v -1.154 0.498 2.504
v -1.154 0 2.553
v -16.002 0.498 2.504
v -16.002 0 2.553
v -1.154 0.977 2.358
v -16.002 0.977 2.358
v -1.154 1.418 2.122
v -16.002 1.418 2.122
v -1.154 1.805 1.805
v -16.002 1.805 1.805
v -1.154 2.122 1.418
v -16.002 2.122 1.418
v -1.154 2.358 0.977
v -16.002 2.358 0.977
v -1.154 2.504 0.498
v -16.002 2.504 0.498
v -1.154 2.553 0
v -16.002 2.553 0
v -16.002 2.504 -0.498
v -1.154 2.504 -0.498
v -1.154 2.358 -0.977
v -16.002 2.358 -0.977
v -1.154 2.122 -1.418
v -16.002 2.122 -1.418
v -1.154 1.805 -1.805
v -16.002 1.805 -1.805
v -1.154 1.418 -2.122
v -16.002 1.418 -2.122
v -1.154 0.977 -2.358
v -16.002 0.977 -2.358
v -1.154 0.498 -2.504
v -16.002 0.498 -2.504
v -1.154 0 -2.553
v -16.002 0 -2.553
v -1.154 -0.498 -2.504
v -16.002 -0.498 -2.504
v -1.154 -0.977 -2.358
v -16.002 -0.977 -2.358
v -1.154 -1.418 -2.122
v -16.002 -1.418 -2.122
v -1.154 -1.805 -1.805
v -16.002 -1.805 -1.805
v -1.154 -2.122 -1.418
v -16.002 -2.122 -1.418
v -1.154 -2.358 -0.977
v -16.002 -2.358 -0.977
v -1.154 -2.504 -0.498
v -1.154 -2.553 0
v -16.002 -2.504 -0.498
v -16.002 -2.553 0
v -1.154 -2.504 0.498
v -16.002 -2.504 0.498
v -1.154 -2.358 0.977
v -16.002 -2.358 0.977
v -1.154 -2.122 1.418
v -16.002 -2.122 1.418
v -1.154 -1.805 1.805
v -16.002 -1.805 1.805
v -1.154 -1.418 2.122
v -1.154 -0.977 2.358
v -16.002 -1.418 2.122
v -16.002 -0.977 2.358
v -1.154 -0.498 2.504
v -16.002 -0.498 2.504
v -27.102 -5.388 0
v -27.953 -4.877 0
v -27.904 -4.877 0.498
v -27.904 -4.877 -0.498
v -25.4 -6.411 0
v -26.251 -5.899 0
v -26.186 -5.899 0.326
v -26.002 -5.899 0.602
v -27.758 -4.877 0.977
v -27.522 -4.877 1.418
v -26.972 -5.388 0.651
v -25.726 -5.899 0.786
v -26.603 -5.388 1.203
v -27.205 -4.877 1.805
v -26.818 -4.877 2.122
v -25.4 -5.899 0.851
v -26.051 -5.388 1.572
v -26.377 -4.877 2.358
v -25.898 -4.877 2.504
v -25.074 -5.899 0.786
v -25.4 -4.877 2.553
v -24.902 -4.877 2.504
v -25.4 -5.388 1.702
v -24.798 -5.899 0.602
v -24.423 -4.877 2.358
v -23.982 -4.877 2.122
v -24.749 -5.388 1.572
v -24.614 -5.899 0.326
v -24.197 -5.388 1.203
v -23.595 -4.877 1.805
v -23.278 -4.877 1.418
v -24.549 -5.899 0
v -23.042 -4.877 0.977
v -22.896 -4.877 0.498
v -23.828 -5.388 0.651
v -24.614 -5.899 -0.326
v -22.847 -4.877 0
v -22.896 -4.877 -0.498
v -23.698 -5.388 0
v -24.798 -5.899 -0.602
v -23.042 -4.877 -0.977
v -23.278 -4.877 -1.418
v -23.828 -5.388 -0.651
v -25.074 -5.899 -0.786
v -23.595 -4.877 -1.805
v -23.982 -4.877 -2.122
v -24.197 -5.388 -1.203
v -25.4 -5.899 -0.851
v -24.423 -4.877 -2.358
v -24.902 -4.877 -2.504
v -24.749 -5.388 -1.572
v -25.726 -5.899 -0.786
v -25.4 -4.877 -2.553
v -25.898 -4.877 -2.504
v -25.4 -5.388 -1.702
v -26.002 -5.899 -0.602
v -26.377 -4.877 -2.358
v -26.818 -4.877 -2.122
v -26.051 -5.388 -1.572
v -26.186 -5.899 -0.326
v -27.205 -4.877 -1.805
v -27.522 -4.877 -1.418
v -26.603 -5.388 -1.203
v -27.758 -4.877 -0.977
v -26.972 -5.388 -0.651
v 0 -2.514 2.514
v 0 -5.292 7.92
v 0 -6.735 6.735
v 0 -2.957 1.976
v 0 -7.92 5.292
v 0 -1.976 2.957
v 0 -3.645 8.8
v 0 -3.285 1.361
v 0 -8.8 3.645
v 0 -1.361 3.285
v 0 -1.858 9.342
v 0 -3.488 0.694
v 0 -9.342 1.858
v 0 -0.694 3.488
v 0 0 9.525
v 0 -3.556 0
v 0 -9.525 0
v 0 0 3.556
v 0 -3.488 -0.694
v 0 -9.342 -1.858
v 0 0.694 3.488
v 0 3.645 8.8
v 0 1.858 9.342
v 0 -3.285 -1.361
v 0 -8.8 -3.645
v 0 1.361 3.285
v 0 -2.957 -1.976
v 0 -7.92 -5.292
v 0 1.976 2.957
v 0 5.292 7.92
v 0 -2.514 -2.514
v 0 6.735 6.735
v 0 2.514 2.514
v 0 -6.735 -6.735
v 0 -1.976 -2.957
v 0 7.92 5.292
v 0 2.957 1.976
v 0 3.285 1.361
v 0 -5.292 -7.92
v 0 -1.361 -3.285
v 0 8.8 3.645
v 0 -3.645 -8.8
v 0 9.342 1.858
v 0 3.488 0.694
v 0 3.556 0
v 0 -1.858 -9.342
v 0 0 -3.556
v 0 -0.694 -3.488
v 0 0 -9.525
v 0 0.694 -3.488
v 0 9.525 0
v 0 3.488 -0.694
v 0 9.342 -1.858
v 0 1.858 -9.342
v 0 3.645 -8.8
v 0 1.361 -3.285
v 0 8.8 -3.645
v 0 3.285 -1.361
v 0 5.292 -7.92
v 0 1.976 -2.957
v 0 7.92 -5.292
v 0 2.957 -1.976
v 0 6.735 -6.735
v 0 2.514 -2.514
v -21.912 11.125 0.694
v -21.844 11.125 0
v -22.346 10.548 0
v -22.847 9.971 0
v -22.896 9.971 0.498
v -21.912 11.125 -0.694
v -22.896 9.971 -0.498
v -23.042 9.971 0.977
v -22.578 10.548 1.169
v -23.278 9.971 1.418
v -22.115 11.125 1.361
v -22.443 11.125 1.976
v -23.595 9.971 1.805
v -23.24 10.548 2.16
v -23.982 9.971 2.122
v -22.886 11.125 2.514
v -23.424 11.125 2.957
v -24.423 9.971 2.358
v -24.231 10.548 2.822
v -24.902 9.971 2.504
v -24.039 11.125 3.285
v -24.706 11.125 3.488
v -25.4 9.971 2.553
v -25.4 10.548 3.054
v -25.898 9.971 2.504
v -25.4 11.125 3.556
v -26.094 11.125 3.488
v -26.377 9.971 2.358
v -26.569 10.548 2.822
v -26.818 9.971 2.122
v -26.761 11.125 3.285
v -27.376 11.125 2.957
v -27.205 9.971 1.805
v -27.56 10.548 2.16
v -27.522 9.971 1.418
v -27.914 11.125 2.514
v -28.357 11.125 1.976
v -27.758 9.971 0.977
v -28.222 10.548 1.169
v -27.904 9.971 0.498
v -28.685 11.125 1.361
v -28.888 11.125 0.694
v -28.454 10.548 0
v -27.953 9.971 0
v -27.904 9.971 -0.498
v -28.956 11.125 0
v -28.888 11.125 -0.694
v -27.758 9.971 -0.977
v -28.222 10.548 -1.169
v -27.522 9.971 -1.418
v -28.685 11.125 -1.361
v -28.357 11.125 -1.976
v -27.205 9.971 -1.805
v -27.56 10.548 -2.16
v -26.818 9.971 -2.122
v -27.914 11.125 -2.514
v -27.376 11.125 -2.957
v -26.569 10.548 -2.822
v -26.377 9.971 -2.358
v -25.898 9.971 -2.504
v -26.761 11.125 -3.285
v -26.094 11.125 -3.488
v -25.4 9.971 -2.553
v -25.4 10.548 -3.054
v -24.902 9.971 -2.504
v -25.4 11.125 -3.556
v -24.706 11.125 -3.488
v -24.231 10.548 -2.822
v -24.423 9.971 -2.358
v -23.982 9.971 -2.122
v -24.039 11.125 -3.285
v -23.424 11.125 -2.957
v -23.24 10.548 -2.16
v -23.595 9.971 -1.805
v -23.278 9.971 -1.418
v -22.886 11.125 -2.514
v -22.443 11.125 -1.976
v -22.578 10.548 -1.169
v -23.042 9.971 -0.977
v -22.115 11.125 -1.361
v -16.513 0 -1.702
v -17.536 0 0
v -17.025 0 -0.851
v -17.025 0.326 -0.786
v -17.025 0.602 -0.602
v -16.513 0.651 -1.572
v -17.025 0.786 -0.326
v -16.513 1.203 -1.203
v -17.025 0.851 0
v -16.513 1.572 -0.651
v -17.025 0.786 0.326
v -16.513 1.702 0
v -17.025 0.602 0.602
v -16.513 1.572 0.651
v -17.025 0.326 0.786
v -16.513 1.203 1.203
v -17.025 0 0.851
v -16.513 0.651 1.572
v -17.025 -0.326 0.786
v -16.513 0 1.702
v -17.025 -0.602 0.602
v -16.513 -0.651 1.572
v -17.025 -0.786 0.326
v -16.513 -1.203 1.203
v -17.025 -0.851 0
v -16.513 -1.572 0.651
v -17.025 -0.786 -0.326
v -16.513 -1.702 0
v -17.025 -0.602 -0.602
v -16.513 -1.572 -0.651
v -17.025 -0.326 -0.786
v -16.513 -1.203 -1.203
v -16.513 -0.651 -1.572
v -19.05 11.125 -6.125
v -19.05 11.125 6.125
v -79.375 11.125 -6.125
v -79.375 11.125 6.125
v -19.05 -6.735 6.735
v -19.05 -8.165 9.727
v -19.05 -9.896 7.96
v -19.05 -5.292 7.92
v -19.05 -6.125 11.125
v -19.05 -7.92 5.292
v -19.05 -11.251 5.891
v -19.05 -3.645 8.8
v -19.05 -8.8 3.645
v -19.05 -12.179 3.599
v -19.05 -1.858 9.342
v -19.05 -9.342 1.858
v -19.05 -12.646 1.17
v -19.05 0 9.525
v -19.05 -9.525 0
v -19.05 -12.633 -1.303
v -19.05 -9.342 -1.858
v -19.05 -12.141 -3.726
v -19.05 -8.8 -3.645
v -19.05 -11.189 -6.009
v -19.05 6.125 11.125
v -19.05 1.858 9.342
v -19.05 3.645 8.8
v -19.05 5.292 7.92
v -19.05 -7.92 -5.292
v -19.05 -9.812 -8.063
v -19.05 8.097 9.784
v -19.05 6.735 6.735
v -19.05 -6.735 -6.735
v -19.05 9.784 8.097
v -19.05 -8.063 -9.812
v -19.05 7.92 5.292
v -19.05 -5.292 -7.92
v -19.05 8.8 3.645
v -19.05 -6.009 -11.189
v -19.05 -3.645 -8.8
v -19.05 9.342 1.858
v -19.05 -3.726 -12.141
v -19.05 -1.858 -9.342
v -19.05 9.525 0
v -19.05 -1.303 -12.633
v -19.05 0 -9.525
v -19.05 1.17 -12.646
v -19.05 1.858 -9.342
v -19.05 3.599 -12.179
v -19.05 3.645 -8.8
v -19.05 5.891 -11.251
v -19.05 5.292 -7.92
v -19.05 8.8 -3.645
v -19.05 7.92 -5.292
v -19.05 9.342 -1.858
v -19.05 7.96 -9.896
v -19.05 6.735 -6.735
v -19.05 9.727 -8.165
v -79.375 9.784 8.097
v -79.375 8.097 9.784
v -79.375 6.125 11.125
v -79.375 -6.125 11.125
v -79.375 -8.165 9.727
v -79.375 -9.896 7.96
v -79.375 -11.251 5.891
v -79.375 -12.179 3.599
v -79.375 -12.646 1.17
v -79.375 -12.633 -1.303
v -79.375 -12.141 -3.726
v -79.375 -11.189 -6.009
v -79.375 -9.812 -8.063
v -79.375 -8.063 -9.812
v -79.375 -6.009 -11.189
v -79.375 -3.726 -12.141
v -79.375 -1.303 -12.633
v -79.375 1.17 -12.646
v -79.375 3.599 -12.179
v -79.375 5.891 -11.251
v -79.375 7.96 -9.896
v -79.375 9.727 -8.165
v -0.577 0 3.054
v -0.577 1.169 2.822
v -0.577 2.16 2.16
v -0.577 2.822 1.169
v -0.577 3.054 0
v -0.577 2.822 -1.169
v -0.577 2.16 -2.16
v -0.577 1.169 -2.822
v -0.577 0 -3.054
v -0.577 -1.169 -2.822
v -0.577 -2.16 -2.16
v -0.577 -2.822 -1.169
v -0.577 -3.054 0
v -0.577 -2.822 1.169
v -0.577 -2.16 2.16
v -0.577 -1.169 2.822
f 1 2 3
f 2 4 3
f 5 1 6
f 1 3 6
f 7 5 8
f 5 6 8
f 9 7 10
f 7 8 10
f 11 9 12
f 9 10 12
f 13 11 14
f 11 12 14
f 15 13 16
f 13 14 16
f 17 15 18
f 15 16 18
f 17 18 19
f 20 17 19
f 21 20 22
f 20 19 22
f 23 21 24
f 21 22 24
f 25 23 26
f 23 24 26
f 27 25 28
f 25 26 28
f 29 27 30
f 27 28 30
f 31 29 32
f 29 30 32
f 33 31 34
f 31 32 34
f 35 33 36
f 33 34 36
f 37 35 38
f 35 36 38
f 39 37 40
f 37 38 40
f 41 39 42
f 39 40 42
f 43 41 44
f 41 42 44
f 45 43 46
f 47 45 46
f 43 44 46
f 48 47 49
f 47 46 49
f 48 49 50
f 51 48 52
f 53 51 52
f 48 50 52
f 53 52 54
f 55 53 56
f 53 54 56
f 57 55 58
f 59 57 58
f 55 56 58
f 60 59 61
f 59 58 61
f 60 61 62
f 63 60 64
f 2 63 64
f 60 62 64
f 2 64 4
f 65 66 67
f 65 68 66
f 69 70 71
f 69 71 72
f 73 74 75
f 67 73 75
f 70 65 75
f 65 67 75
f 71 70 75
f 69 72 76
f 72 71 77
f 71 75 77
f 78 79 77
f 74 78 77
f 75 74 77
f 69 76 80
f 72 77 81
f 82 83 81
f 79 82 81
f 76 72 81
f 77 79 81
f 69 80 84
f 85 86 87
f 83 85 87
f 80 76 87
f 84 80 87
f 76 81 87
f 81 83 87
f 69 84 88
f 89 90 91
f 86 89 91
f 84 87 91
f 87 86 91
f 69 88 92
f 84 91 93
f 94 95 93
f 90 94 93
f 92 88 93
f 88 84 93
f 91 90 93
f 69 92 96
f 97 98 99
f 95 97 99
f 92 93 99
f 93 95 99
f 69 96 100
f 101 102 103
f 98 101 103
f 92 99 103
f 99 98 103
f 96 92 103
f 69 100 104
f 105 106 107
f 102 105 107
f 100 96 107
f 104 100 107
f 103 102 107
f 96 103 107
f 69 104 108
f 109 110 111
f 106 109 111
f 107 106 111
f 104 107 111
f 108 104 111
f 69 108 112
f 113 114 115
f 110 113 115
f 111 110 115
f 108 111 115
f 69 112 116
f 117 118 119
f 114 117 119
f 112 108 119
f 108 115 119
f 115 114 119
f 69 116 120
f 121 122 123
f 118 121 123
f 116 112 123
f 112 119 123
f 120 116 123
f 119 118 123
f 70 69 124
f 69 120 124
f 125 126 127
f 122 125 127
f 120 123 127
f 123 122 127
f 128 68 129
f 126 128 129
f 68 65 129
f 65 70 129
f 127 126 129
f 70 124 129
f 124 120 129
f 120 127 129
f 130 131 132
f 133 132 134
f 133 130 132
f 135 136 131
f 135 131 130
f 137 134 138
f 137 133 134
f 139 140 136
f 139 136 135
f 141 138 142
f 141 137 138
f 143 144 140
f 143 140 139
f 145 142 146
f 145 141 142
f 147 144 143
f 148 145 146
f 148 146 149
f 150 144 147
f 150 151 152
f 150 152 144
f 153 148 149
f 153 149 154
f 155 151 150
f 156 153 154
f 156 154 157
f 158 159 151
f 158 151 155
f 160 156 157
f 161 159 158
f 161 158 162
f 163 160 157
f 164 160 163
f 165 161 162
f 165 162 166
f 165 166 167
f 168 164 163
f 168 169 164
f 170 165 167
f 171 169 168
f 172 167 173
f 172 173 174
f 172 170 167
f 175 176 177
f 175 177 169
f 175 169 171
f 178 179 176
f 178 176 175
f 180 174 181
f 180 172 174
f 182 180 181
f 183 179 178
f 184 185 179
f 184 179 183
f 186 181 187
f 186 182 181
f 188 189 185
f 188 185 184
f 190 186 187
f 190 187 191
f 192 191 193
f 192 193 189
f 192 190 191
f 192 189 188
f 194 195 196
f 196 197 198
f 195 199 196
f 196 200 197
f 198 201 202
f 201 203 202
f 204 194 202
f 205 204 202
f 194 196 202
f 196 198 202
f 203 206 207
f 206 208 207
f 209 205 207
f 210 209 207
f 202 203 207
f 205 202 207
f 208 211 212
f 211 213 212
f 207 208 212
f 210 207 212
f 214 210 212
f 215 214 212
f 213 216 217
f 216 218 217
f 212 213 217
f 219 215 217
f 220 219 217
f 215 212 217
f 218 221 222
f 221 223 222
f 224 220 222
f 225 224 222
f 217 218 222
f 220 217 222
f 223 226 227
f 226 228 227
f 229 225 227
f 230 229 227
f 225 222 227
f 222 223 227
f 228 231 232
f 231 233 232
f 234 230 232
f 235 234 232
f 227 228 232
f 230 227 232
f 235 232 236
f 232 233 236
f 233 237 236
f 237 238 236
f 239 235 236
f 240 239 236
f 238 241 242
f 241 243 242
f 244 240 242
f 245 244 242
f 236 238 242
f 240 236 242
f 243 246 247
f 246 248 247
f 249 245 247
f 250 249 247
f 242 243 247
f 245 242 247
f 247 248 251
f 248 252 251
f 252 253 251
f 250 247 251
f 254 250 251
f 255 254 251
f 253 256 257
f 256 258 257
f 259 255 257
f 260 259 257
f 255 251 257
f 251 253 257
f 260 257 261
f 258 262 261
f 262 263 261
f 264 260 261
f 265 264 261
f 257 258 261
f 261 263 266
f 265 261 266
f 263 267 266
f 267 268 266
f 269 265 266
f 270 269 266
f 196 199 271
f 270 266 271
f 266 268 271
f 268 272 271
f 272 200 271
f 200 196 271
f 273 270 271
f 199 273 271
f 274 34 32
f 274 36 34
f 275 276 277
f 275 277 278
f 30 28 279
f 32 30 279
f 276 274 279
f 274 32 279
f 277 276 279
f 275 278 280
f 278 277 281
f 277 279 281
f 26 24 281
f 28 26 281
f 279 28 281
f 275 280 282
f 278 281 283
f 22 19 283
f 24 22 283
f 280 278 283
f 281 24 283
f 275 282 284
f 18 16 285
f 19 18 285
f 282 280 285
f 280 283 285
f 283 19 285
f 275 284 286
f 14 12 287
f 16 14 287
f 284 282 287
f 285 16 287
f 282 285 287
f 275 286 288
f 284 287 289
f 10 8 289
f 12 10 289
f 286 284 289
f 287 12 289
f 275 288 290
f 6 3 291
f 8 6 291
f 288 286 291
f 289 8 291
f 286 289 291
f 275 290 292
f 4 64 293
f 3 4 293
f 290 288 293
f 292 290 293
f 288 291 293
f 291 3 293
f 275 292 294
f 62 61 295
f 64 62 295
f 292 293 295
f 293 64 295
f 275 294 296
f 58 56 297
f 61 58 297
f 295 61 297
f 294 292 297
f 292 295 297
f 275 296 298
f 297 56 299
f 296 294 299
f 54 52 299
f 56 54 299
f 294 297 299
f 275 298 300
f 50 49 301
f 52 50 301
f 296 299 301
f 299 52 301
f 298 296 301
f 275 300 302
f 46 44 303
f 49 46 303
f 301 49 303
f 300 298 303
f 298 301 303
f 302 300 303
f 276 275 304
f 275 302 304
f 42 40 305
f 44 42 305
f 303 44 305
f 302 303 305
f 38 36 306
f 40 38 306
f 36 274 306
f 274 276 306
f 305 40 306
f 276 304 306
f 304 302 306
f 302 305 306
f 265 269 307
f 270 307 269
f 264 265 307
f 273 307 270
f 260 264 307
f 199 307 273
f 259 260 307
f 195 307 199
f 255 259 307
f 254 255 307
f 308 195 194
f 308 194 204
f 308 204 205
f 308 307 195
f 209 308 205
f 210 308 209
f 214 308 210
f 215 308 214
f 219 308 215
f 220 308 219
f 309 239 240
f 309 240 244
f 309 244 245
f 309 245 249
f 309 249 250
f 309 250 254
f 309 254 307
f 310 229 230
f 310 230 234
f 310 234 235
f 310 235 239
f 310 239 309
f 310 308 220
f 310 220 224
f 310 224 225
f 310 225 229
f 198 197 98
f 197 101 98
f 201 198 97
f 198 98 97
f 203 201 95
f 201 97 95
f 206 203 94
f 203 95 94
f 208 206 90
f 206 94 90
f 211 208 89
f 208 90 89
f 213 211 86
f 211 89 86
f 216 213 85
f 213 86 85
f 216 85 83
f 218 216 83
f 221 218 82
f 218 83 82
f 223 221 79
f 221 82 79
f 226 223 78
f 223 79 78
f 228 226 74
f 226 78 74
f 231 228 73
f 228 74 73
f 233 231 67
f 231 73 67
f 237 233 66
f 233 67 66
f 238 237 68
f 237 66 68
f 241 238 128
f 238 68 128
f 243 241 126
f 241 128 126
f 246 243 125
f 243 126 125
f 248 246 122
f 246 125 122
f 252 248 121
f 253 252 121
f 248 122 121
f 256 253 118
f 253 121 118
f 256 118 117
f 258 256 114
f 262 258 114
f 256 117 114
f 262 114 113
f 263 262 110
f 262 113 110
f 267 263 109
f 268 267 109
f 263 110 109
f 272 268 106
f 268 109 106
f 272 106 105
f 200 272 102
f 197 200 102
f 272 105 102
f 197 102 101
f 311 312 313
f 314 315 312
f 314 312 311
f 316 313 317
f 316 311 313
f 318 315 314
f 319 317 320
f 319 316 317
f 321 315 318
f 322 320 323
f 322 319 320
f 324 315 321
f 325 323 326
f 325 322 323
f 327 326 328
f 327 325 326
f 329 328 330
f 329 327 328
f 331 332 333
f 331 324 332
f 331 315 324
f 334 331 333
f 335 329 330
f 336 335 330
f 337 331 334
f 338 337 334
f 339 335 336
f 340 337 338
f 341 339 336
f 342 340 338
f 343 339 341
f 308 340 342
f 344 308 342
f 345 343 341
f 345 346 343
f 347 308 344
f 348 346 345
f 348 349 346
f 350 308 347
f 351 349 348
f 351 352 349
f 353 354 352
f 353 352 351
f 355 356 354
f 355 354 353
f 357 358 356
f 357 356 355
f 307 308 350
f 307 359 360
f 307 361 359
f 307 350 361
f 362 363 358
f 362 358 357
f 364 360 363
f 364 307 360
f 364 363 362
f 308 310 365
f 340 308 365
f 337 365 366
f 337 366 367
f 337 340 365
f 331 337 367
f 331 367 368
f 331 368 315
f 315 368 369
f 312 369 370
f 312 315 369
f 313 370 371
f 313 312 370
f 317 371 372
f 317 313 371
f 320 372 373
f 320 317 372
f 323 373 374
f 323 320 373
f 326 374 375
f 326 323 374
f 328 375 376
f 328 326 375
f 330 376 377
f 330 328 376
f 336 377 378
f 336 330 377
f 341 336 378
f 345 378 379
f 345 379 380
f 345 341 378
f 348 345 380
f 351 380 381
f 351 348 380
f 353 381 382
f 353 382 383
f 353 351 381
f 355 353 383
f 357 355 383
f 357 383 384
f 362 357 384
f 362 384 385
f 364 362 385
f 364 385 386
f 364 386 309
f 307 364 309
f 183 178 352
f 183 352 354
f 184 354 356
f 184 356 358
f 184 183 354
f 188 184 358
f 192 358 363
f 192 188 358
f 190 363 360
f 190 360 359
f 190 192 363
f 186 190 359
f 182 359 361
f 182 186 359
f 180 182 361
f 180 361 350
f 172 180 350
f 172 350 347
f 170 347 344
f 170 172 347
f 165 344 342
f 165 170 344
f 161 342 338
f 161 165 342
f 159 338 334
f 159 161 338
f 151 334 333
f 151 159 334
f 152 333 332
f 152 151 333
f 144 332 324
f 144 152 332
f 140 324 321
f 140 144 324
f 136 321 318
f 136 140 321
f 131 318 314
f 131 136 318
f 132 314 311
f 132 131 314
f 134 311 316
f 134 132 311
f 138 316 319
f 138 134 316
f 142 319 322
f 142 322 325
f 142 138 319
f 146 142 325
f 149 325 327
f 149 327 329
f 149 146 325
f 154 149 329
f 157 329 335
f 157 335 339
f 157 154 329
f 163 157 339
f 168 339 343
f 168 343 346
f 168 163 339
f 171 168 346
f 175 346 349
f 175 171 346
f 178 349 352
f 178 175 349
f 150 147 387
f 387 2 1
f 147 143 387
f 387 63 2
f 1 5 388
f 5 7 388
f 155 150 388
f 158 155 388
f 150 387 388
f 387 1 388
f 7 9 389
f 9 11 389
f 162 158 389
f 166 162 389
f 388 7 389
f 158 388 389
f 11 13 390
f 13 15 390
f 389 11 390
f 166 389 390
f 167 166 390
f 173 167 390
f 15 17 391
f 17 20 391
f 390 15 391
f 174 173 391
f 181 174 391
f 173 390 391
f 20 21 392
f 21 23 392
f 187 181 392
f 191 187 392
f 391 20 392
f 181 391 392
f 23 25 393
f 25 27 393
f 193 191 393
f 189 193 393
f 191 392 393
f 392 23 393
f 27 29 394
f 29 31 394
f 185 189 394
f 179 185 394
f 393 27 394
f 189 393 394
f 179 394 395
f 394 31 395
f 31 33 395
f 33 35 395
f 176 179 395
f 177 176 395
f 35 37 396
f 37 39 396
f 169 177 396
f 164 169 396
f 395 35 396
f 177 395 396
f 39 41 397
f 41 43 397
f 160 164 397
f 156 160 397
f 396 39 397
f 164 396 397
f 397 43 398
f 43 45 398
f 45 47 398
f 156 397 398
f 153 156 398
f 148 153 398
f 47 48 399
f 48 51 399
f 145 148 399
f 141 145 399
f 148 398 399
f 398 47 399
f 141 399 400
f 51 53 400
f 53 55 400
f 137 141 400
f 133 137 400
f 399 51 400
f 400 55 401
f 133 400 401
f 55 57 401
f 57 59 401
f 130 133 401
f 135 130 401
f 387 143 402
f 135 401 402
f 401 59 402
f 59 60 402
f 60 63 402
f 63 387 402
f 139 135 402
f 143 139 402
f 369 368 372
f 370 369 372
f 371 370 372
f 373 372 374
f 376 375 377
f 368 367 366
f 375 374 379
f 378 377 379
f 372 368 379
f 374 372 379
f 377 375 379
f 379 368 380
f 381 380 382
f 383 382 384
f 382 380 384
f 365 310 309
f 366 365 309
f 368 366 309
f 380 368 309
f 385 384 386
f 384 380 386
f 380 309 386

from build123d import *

# Parameters (mm, degrees)
SKETCH1_R                         = 12.7
BOSS_EXTRUDE1_DEPTH               = 79.375
SKETCH2_R                         = 21.293421543
SKETCH2_R_2                       = 9.525
CUT_EXTRUDE1_DEPTH                = 19.05
SKETCH3_W                         = 88.347660667
SKETCH3_H                         = 62.084650607
CUT_EXTRUDE2_DEPTH                = 7.62
SKETCH7_W                         = 118.824828897
SKETCH7_H                         = 51.847980611
CUT_EXTRUDE5_DEPTH                = 25.4
F_1_4_20_TAPPED_HOLE2_D           = 5.1054
F_1_4_20_TAPPED_HOLE2_DEPTH       = 16.002
F_1_4_20_TAPPED_HOLE2_CSINK_D     = 7.112
F_1_4_20_TAPPED_HOLE2_CSINK_ANGLE = 82
F_1_4_20_TAPPED_HOLE2_TIP         = 1.533816902
F_1_4_20_TAPPED_HOLE3_D           = 5.1054
F_1_4_20_TAPPED_HOLE3_DEPTH       = 16.002
F_1_4_20_TAPPED_HOLE3_CSINK_D     = 7.112
F_1_4_20_TAPPED_HOLE3_CSINK_ANGLE = 82
F_1_4_20_TAPPED_HOLE3_TIP         = 1.533816902


with BuildPart() as part:
    # Sketch1 → Boss-Extrude1 (new body)
    with BuildSketch(Plane(origin=(0, 0, 0), x_dir=(0, 0, -1), z_dir=(1, 0, 0))):
        Circle(SKETCH1_R)
    extrude(amount=-BOSS_EXTRUDE1_DEPTH)

    # Sketch2 → Cut-Extrude1 (cut)
    with BuildSketch(Plane(origin=(0, 0, 0), x_dir=(0, 0, -1), z_dir=(1, 0, 0))):
        Circle(SKETCH2_R)
        Circle(SKETCH2_R_2, mode=Mode.SUBTRACT)
    extrude(amount=-CUT_EXTRUDE1_DEPTH, mode=Mode.SUBTRACT)

    # Sketch3 → Cut-Extrude2 (cut)
    with BuildSketch(Plane(origin=(0, 12.401228443, 11.1252), x_dir=(1, 0, 0), z_dir=(0, 0, 1))):
        with Locations((-47.069787049, -6.880973923)):
            Rectangle(SKETCH3_W, SKETCH3_H)
    extrude(amount=CUT_EXTRUDE2_DEPTH, mode=Mode.SUBTRACT)

    # Sketch7 → Cut-Extrude5 (cut)
    with BuildSketch(Plane(origin=(0, 11.1252, 0), x_dir=(-1, 0, 0), z_dir=(0, 1, 0))):
        with Locations((37.000899043, -1.114295637)):
            Rectangle(SKETCH7_W, SKETCH7_H)
    extrude(amount=CUT_EXTRUDE5_DEPTH, mode=Mode.SUBTRACT)

    # 1/4-20 Tapped Hole2
    with Locations(Plane(origin=(0, 11.1252, 0), x_dir=(-1, 0, 0), z_dir=(0, 1, 0))):
        with Locations((25.4, 0)):
            CounterSinkHole(F_1_4_20_TAPPED_HOLE2_D / 2, F_1_4_20_TAPPED_HOLE2_CSINK_D / 2, depth=F_1_4_20_TAPPED_HOLE2_DEPTH, counter_sink_angle=F_1_4_20_TAPPED_HOLE2_CSINK_ANGLE)
            with Locations((0, 0, -(F_1_4_20_TAPPED_HOLE2_DEPTH + F_1_4_20_TAPPED_HOLE2_TIP / 2))):  # 118° drill point
                Cone(0, F_1_4_20_TAPPED_HOLE2_D / 2, F_1_4_20_TAPPED_HOLE2_TIP, mode=Mode.SUBTRACT)

    # 1/4-20 Tapped Hole3
    with Locations(Plane(origin=(0, 0, 0), x_dir=(0, 0, -1), z_dir=(1, 0, 0))):
        with Locations((0, 0)):
            CounterSinkHole(F_1_4_20_TAPPED_HOLE3_D / 2, F_1_4_20_TAPPED_HOLE3_CSINK_D / 2, depth=F_1_4_20_TAPPED_HOLE3_DEPTH, counter_sink_angle=F_1_4_20_TAPPED_HOLE3_CSINK_ANGLE)
            with Locations((0, 0, -(F_1_4_20_TAPPED_HOLE3_DEPTH + F_1_4_20_TAPPED_HOLE3_TIP / 2))):  # 118° drill point
                Cone(0, F_1_4_20_TAPPED_HOLE3_D / 2, F_1_4_20_TAPPED_HOLE3_TIP, mode=Mode.SUBTRACT)


solid = part.part
